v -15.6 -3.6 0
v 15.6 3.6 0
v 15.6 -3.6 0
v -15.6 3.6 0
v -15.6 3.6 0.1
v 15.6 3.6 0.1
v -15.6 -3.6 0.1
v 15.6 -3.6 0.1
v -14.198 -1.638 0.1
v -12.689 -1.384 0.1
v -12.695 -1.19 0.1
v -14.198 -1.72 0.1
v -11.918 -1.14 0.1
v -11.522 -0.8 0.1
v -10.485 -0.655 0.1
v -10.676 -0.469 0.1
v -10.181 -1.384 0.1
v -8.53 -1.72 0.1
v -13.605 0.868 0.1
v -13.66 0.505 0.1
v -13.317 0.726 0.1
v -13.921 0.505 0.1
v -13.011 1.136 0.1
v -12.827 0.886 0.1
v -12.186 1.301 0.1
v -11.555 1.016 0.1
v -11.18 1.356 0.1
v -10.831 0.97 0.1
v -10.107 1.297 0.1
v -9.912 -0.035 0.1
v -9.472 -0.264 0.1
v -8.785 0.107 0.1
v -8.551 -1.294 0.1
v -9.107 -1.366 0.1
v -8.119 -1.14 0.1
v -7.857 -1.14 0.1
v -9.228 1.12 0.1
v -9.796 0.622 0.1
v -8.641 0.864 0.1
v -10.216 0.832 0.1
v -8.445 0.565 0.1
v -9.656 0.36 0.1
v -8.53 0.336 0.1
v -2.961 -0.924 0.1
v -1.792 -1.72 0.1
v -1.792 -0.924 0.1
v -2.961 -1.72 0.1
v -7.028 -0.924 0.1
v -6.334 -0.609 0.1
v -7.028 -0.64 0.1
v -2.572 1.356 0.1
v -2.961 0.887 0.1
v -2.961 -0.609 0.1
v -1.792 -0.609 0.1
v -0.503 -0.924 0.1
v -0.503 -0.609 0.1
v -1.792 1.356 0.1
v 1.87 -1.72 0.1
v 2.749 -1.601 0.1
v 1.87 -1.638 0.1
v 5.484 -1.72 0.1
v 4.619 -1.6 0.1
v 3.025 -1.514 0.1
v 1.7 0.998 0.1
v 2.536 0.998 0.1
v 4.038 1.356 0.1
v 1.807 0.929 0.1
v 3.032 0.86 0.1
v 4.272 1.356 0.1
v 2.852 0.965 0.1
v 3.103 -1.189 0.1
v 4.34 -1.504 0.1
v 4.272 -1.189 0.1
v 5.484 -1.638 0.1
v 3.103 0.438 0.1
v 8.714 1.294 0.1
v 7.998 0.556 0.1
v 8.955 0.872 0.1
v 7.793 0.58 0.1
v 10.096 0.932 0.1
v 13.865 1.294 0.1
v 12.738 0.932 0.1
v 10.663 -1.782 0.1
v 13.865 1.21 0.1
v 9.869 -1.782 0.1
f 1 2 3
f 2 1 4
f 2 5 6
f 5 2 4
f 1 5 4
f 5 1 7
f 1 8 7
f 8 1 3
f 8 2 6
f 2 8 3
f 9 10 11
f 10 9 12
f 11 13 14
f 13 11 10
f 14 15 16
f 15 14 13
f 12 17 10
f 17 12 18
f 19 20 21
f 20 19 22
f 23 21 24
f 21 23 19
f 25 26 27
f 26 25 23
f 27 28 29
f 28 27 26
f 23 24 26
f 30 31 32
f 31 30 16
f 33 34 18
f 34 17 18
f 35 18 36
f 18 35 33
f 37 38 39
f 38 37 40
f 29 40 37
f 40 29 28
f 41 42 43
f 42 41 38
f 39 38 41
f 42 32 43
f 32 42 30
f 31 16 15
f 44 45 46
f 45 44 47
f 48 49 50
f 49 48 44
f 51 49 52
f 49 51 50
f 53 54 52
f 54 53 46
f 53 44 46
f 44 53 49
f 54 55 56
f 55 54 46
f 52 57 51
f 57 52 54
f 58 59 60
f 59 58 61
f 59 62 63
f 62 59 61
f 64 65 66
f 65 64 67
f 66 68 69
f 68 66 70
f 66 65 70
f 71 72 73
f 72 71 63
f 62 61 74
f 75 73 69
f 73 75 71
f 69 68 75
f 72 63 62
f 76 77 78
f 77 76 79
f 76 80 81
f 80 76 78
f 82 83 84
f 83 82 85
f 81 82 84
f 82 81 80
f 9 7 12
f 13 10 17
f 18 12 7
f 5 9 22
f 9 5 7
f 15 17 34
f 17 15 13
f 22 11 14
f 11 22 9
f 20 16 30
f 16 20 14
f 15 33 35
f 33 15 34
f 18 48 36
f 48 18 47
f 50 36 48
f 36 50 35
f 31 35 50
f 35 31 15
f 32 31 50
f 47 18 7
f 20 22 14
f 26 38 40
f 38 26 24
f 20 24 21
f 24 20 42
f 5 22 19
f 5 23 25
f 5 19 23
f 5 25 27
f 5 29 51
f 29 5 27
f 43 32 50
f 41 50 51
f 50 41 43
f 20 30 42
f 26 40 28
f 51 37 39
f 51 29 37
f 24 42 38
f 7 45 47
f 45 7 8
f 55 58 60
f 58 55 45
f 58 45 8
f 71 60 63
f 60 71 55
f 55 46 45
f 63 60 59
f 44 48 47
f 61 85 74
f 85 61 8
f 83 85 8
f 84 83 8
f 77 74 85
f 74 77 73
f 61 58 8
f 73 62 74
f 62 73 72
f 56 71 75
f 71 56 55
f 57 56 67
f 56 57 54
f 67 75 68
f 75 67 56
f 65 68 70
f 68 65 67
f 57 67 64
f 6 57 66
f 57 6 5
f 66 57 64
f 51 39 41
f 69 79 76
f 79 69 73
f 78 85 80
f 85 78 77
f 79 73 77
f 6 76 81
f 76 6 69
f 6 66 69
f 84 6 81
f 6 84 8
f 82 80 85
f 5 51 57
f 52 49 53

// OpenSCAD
// file: ../p/4-4edge.scad
use <../lib.scad>
$fa=1; $fs=0.2;
function ldraw_lib__4_4edge(realsolid=false) = [
// 0 Circle 1.0
// 0 Name: 4-4edge.dat
// 0 Author: James Jessiman
// 0 !LDRAW_ORG Primitive UPDATE 2017-01
// 0 !LICENSE Licensed under CC BY 2.0 and CC BY 4.0 : see CAreadme.txt
// 
// 0 BFC CERTIFY CCW
  [0,"BFC","CERTIFY"],
  [0,"BFC","CCW"],
// 
// 0 !HISTORY 1998-12-15 [PTadmin] Official Update 1998-10
// 0 !HISTORY 2005-12-28 [PTadmin] Official Update 2005-01
// 0 !HISTORY 2007-06-24 [PTadmin] Header formatted for Contributor Agreement
// 0 !HISTORY 2008-07-01 [PTadmin] Official Update 2008-01
// 0 !HISTORY 2017-01-15 [Steffen] BFCed
// 0 !HISTORY 2017-12-30 [PTadmin] Official Update 2017-01
// 
// 
// 2 24 1 0 0 0.9239 0 0.3827
  [2,24,1,0,0,0.9239,0,0.3827],
// 2 24 0.9239 0 0.3827 0.7071 0 0.7071
  [2,24,0.9239,0,0.3827,0.7071,0,0.7071],
// 2 24 0.7071 0 0.7071 0.3827 0 0.9239
  [2,24,0.7071,0,0.7071,0.3827,0,0.9239],
// 2 24 0.3827 0 0.9239 0 0 1
  [2,24,0.3827,0,0.9239,0,0,1],
// 2 24 0 0 1 -0.3827 0 0.9239
  [2,24,0,0,1,-0.3827,0,0.9239],
// 2 24 -0.3827 0 0.9239 -0.7071 0 0.7071
  [2,24,-0.3827,0,0.9239,-0.7071,0,0.7071],
// 2 24 -0.7071 0 0.7071 -0.9239 0 0.3827
  [2,24,-0.7071,0,0.7071,-0.9239,0,0.3827],
// 2 24 -0.9239 0 0.3827 -1 0 -0
  [2,24,-0.9239,0,0.3827,-1,0,-0],
// 2 24 -1 0 -0 -0.9239 0 -0.3827
  [2,24,-1,0,-0,-0.9239,0,-0.3827],
// 2 24 -0.9239 0 -0.3827 -0.7071 0 -0.7071
  [2,24,-0.9239,0,-0.3827,-0.7071,0,-0.7071],
// 2 24 -0.7071 0 -0.7071 -0.3827 0 -0.9239
  [2,24,-0.7071,0,-0.7071,-0.3827,0,-0.9239],
// 2 24 -0.3827 0 -0.9239 0 0 -1
  [2,24,-0.3827,0,-0.9239,0,0,-1],
// 2 24 0 0 -1 0.3827 0 -0.9239
  [2,24,0,0,-1,0.3827,0,-0.9239],
// 2 24 0.3827 0 -0.9239 0.7071 0 -0.7071
  [2,24,0.3827,0,-0.9239,0.7071,0,-0.7071],
// 2 24 0.7071 0 -0.7071 0.9239 0 -0.3827
  [2,24,0.7071,0,-0.7071,0.9239,0,-0.3827],
// 2 24 0.9239 0 -0.3827 1 0 0
  [2,24,0.9239,0,-0.3827,1,0,0],
];
module ldraw_lib__4_4edge(step=0, col=false, unit=2/5, alt=false, line=0.2, solid=!$preview)
    makepoly(ldraw_lib__4_4edge(solid), step=step, col=col, unit=unit, alt=alt, line=line, solid=solid);
ldraw_lib__4_4edge(line=0.2);
// file: ../p/4-4disc.scad
use <../lib.scad>
$fa=1; $fs=0.2;
function ldraw_lib__4_4disc(realsolid=false) = [
// 0 Disc 1.0
// 0 Name: 4-4disc.dat
// 0 Author: James Jessiman
// 0 !LDRAW_ORG Primitive UPDATE 2002-02
// 0 !LICENSE Licensed under CC BY 2.0 and CC BY 4.0 : see CAreadme.txt
// 
// 0 BFC CERTIFY CCW
  [0,"BFC","CERTIFY"],
  [0,"BFC","CCW"],
// 
// 0 !HISTORY 1998-12-15 [PTadmin] Official Update 1998-10
// 0 !HISTORY 2002-03-23 [sbliss] Added BFC statement
// 0 !HISTORY 2002-04-25 [PTadmin] Official Update 2002-02
// 0 !HISTORY 2007-06-24 [PTadmin] Header formatted for Contributor Agreement
// 0 !HISTORY 2008-07-01 [PTadmin] Official Update 2008-01
// 
// 
// 3 16 0 0 0 1 0 0 0.9239 0 0.3827
  [3,16,0,0,0,1,0,0,0.9239,0,0.3827],
// 3 16 0 0 0 0.9239 0 0.3827 0.7071 0 0.7071
  [3,16,0,0,0,0.9239,0,0.3827,0.7071,0,0.7071],
// 3 16 0 0 0 0.7071 0 0.7071 0.3827 0 0.9239
  [3,16,0,0,0,0.7071,0,0.7071,0.3827,0,0.9239],
// 3 16 0 0 0 0.3827 0 0.9239 0 0 1
  [3,16,0,0,0,0.3827,0,0.9239,0,0,1],
// 3 16 0 0 0 0 0 1 -0.3827 0 0.9239
  [3,16,0,0,0,0,0,1,-0.3827,0,0.9239],
// 3 16 0 0 0 -0.3827 0 0.9239 -0.7071 0 0.7071
  [3,16,0,0,0,-0.3827,0,0.9239,-0.7071,0,0.7071],
// 3 16 0 0 0 -0.7071 0 0.7071 -0.9239 0 0.3827
  [3,16,0,0,0,-0.7071,0,0.7071,-0.9239,0,0.3827],
// 3 16 0 0 0 -0.9239 0 0.3827 -1 0 -0
  [3,16,0,0,0,-0.9239,0,0.3827,-1,0,-0],
// 3 16 0 0 0 -1 0 -0 -0.9239 0 -0.3827
  [3,16,0,0,0,-1,0,-0,-0.9239,0,-0.3827],
// 3 16 0 0 0 -0.9239 0 -0.3827 -0.7071 0 -0.7071
  [3,16,0,0,0,-0.9239,0,-0.3827,-0.7071,0,-0.7071],
// 3 16 0 0 0 -0.7071 0 -0.7071 -0.3827 0 -0.9239
  [3,16,0,0,0,-0.7071,0,-0.7071,-0.3827,0,-0.9239],
// 3 16 0 0 0 -0.3827 0 -0.9239 0 0 -1
  [3,16,0,0,0,-0.3827,0,-0.9239,0,0,-1],
// 3 16 0 0 0 0 0 -1 0.3827 0 -0.9239
  [3,16,0,0,0,0,0,-1,0.3827,0,-0.9239],
// 3 16 0 0 0 0.3827 0 -0.9239 0.7071 0 -0.7071
  [3,16,0,0,0,0.3827,0,-0.9239,0.7071,0,-0.7071],
// 3 16 0 0 0 0.7071 0 -0.7071 0.9239 0 -0.3827
  [3,16,0,0,0,0.7071,0,-0.7071,0.9239,0,-0.3827],
// 3 16 0 0 0 0.9239 0 -0.3827 1 0 0
  [3,16,0,0,0,0.9239,0,-0.3827,1,0,0],
// 0
];
module ldraw_lib__4_4disc(step=0, col=false, unit=2/5, alt=false, line=0.2, solid=!$preview)
    makepoly(ldraw_lib__4_4disc(solid), step=step, col=col, unit=unit, alt=alt, line=line, solid=solid);
ldraw_lib__4_4disc(line=0.2);
// file: ../p/4-4cyli.scad
use <../lib.scad>
$fa=1; $fs=0.2;
function ldraw_lib__4_4cyli(realsolid=false) = [
// 0 Cylinder 1.0
// 0 Name: 4-4cyli.dat
// 0 Author: James Jessiman
// 0 !LDRAW_ORG Primitive UPDATE 2005-01
// 0 !LICENSE Licensed under CC BY 2.0 and CC BY 4.0 : see CAreadme.txt
// 
// 0 BFC CERTIFY CCW
  [0,"BFC","CERTIFY"],
  [0,"BFC","CCW"],
// 
// 0 !HISTORY 1998-12-15 [PTadmin] Official Update 1998-10
// 0 !HISTORY 2002-03-23 [sbliss] Added BFC statement; merged headers from files in distributions LDraw 0.27 and Complete.
// 0 !HISTORY 2002-04-25 [PTadmin] Official Update 2002-02
// 0 !HISTORY 2004-12-14 [guyvivan] BFC CCW
// 0 !HISTORY 2005-12-28 [PTadmin] Official Update 2005-01
// 0 !HISTORY 2007-06-24 [PTadmin] Header formatted for Contributor Agreement
// 0 !HISTORY 2008-07-01 [PTadmin] Official Update 2008-01
// 
// 
// 4 16 1 1 0 0.9239 1 0.3827 0.9239 0 0.3827 1 0 0
  [4,16,1,1,0,0.9239,1,0.3827,0.9239,0,0.3827,1,0,0],
// 5 24 1 0 0 1 1 0 0.9239 0 0.3827 0.9239 0 -0.3827
  [5,24,1,0,0,1,1,0,0.9239,0,0.3827,0.9239,0,-0.3827],
// 4 16 0.9239 1 0.3827 0.7071 1 0.7071 0.7071 0 0.7071 0.9239 0 0.3827
  [4,16,0.9239,1,0.3827,0.7071,1,0.7071,0.7071,0,0.7071,0.9239,0,0.3827],
// 5 24 0.9239 0 0.3827 0.9239 1 0.3827 0.7071 0 0.7071 1 0 0
  [5,24,0.9239,0,0.3827,0.9239,1,0.3827,0.7071,0,0.7071,1,0,0],
// 4 16 0.7071 1 0.7071 0.3827 1 0.9239 0.3827 0 0.9239 0.7071 0 0.7071
  [4,16,0.7071,1,0.7071,0.3827,1,0.9239,0.3827,0,0.9239,0.7071,0,0.7071],
// 5 24 0.7071 0 0.7071 0.7071 1 0.7071 0.3827 0 0.9239 0.9239 0 0.3827
  [5,24,0.7071,0,0.7071,0.7071,1,0.7071,0.3827,0,0.9239,0.9239,0,0.3827],
// 4 16 0.3827 1 0.9239 0 1 1 0 0 1 0.3827 0 0.9239
  [4,16,0.3827,1,0.9239,0,1,1,0,0,1,0.3827,0,0.9239],
// 5 24 0.3827 0 0.9239 0.3827 1 0.9239 0 0 1 0.7071 0 0.7071
  [5,24,0.3827,0,0.9239,0.3827,1,0.9239,0,0,1,0.7071,0,0.7071],
// 4 16 0 1 1 -0.3827 1 0.9239 -0.3827 0 0.9239 0 0 1
  [4,16,0,1,1,-0.3827,1,0.9239,-0.3827,0,0.9239,0,0,1],
// 5 24 0 0 1 0 1 1 -0.3827 0 0.9239 0.3827 0 0.9239
  [5,24,0,0,1,0,1,1,-0.3827,0,0.9239,0.3827,0,0.9239],
// 4 16 -0.3827 1 0.9239 -0.7071 1 0.7071 -0.7071 0 0.7071 -0.3827 0 0.9239
  [4,16,-0.3827,1,0.9239,-0.7071,1,0.7071,-0.7071,0,0.7071,-0.3827,0,0.9239],
// 5 24 -0.3827 0 0.9239 -0.3827 1 0.9239 -0.7071 0 0.7071 0 0 1
  [5,24,-0.3827,0,0.9239,-0.3827,1,0.9239,-0.7071,0,0.7071,0,0,1],
// 4 16 -0.7071 1 0.7071 -0.9239 1 0.3827 -0.9239 0 0.3827 -0.7071 0 0.7071
  [4,16,-0.7071,1,0.7071,-0.9239,1,0.3827,-0.9239,0,0.3827,-0.7071,0,0.7071],
// 5 24 -0.7071 0 0.7071 -0.7071 1 0.7071 -0.9239 0 0.3827 -0.3827 0 0.9239
  [5,24,-0.7071,0,0.7071,-0.7071,1,0.7071,-0.9239,0,0.3827,-0.3827,0,0.9239],
// 4 16 -0.9239 1 0.3827 -1 1 0 -1 0 0 -0.9239 0 0.3827
  [4,16,-0.9239,1,0.3827,-1,1,0,-1,0,0,-0.9239,0,0.3827],
// 5 24 -0.9239 0 0.3827 -0.9239 1 0.3827 -1 0 0 -0.7071 0 0.7071
  [5,24,-0.9239,0,0.3827,-0.9239,1,0.3827,-1,0,0,-0.7071,0,0.7071],
// 4 16 -1 1 0 -0.9239 1 -0.3827 -0.9239 0 -0.3827 -1 0 0
  [4,16,-1,1,0,-0.9239,1,-0.3827,-0.9239,0,-0.3827,-1,0,0],
// 5 24 -1 0 0 -1 1 0 -0.9239 0 -0.3827 -0.9239 0 0.3827
  [5,24,-1,0,0,-1,1,0,-0.9239,0,-0.3827,-0.9239,0,0.3827],
// 4 16 -0.9239 1 -0.3827 -0.7071 1 -0.7071 -0.7071 0 -0.7071 -0.9239 0 -0.3827
  [4,16,-0.9239,1,-0.3827,-0.7071,1,-0.7071,-0.7071,0,-0.7071,-0.9239,0,-0.3827],
// 5 24 -0.9239 0 -0.3827 -0.9239 1 -0.3827 -0.7071 0 -0.7071 -1 0 0
  [5,24,-0.9239,0,-0.3827,-0.9239,1,-0.3827,-0.7071,0,-0.7071,-1,0,0],
// 4 16 -0.7071 1 -0.7071 -0.3827 1 -0.9239 -0.3827 0 -0.9239 -0.7071 0 -0.7071
  [4,16,-0.7071,1,-0.7071,-0.3827,1,-0.9239,-0.3827,0,-0.9239,-0.7071,0,-0.7071],
// 5 24 -0.7071 0 -0.7071 -0.7071 1 -0.7071 -0.3827 0 -0.9239 -0.9239 0 -0.3827
  [5,24,-0.7071,0,-0.7071,-0.7071,1,-0.7071,-0.3827,0,-0.9239,-0.9239,0,-0.3827],
// 4 16 -0.3827 1 -0.9239 0 1 -1 0 0 -1 -0.3827 0 -0.9239
  [4,16,-0.3827,1,-0.9239,0,1,-1,0,0,-1,-0.3827,0,-0.9239],
// 5 24 -0.3827 0 -0.9239 -0.3827 1 -0.9239 0 0 -1 -0.7071 0 -0.7071
  [5,24,-0.3827,0,-0.9239,-0.3827,1,-0.9239,0,0,-1,-0.7071,0,-0.7071],
// 4 16 0 1 -1 0.3827 1 -0.9239 0.3827 0 -0.9239 0 0 -1
  [4,16,0,1,-1,0.3827,1,-0.9239,0.3827,0,-0.9239,0,0,-1],
// 5 24 0 0 -1 0 1 -1 0.3827 0 -0.9239 -0.3827 0 -0.9239
  [5,24,0,0,-1,0,1,-1,0.3827,0,-0.9239,-0.3827,0,-0.9239],
// 4 16 0.3827 1 -0.9239 0.7071 1 -0.7071 0.7071 0 -0.7071 0.3827 0 -0.9239
  [4,16,0.3827,1,-0.9239,0.7071,1,-0.7071,0.7071,0,-0.7071,0.3827,0,-0.9239],
// 5 24 0.3827 0 -0.9239 0.3827 1 -0.9239 0.7071 0 -0.7071 0 0 -1
  [5,24,0.3827,0,-0.9239,0.3827,1,-0.9239,0.7071,0,-0.7071,0,0,-1],
// 4 16 0.7071 1 -0.7071 0.9239 1 -0.3827 0.9239 0 -0.3827 0.7071 0 -0.7071
  [4,16,0.7071,1,-0.7071,0.9239,1,-0.3827,0.9239,0,-0.3827,0.7071,0,-0.7071],
// 5 24 0.7071 0 -0.7071 0.7071 1 -0.7071 0.9239 0 -0.3827 0.3827 0 -0.9239
  [5,24,0.7071,0,-0.7071,0.7071,1,-0.7071,0.9239,0,-0.3827,0.3827,0,-0.9239],
// 4 16 0.9239 1 -0.3827 1 1 0 1 0 0 0.9239 0 -0.3827
  [4,16,0.9239,1,-0.3827,1,1,0,1,0,0,0.9239,0,-0.3827],
// 5 24 0.9239 0 -0.3827 0.9239 1 -0.3827 1 0 0 0.7071 0 -0.7071
  [5,24,0.9239,0,-0.3827,0.9239,1,-0.3827,1,0,0,0.7071,0,-0.7071],
// 0
];
module ldraw_lib__4_4cyli(step=0, col=false, unit=2/5, alt=false, line=0.2, solid=!$preview)
    makepoly(ldraw_lib__4_4cyli(solid), step=step, col=col, unit=unit, alt=alt, line=line, solid=solid);
ldraw_lib__4_4cyli(line=0.2);
// file: ../p/stud3.scad
use <../lib.scad>
use <4-4cyli.scad>
use <4-4disc.scad>
use <4-4edge.scad>
$fa=1; $fs=0.2;
function ldraw_lib__stud3(realsolid=false) = realsolid ? 
    [openscad(translate([0,0,-eps()], o=cylinder(4+eps(), r=4)),2)] : [
// 0 Stud Tube Solid
// 0 Name: stud3.dat
// 0 Author: James Jessiman
// 0 !LDRAW_ORG Primitive UPDATE 2012-01
// 0 !LICENSE Licensed under CC BY 2.0 and CC BY 4.0 : see CAreadme.txt
// 
// 0 BFC CERTIFY CCW
  [0,"BFC","CERTIFY"],
  [0,"BFC","CCW"],
// 
// 0 !HISTORY 2002-04-04 [sbliss] Modified for BFC compliance
// 0 !HISTORY 2002-04-25 [PTadmin] Official Update 2002-02
// 0 !HISTORY 2007-06-24 [PTadmin] Header formatted for Contributor Agreement
// 0 !HISTORY 2008-07-01 [PTadmin] Official Update 2008-01
// 0 !HISTORY 2012-02-16 [Philo] Changed to CCW
// 0 !HISTORY 2012-03-30 [PTadmin] Official Update 2012-01
// 
// 
// 1 16 0 -4 0 4 0 0 0 1 0 0 0 4 4-4edge.dat
  [1,16,0,-4,0,4,0,0,0,1,0,0,0,4, ldraw_lib__4_4edge(realsolid)],
// 1 16 0 0 0 4 0 0 0 1 0 0 0 4 4-4edge.dat
  [1,16,0,0,0,4,0,0,0,1,0,0,0,4, ldraw_lib__4_4edge(realsolid)],
// 1 16 0 -4 0 4 0 0 0 1 0 0 0 4 4-4disc.dat
  [1,16,0,-4,0,4,0,0,0,1,0,0,0,4, ldraw_lib__4_4disc(realsolid)],
// 1 16 0 -4 0 4 0 0 0 4 0 0 0 4 4-4cyli.dat
  [1,16,0,-4,0,4,0,0,0,4,0,0,0,4, ldraw_lib__4_4cyli(realsolid)],
];
module ldraw_lib__stud3(step=0, col=false, unit=2/5, alt=false, line=0.2, solid=!$preview)
    makepoly(ldraw_lib__stud3(solid), step=step, col=col, unit=unit, alt=alt, line=line, solid=solid);
ldraw_lib__stud3(line=0.2);
// file: ../p/stud.scad
use <../lib.scad>
use <4-4cyli.scad>
use <4-4disc.scad>
use <4-4edge.scad>
$fa=1; $fs=0.2;
function ldraw_lib__stud(realsolid=false) = realsolid ? 
    [openscad(translate([0,0,-eps()], o=cylinder(4+eps(), r=6)),2)] : [
// 0 Stud
// 0 Name: stud.dat
// 0 Author: James Jessiman
// 0 !LDRAW_ORG Primitive UPDATE 2012-01
// 0 !LICENSE Licensed under CC BY 2.0 and CC BY 4.0 : see CAreadme.txt
// 
// 0 BFC CERTIFY CCW
  [0,"BFC","CERTIFY"],
  [0,"BFC","CCW"],
// 
// 0 !HISTORY 2002-04-04 [sbliss] Modified for BFC compliance
// 0 !HISTORY 2002-04-25 [PTadmin] Official Update 2002-02
// 0 !HISTORY 2007-06-24 [PTadmin] Header formatted for Contributor Agreement
// 0 !HISTORY 2008-07-01 [PTadmin] Official Update 2008-01
// 0 !HISTORY 2012-02-16 [Philo] Changed to CCW
// 0 !HISTORY 2012-03-30 [PTadmin] Official Update 2012-01
// 
// 
// 1 16 0 0 0 6 0 0 0 1 0 0 0 6 4-4edge.dat
  [1,16,0,0,0,6,0,0,0,1,0,0,0,6, ldraw_lib__4_4edge(realsolid)],
// 1 16 0 -4 0 6 0 0 0 1 0 0 0 6 4-4edge.dat
  [1,16,0,-4,0,6,0,0,0,1,0,0,0,6, ldraw_lib__4_4edge(realsolid)],
// 1 16 0 0 0 6 0 0 0 -4 0 0 0 6 4-4cyli.dat
  [1,16,0,0,0,6,0,0,0,-4,0,0,0,6, ldraw_lib__4_4cyli(realsolid)],
// 1 16 0 -4 0 6 0 0 0 1 0 0 0 6 4-4disc.dat
  [1,16,0,-4,0,6,0,0,0,1,0,0,0,6, ldraw_lib__4_4disc(realsolid)],
];
module ldraw_lib__stud(step=0, col=false, unit=2/5, alt=false, line=0.2, solid=!$preview)
    makepoly(ldraw_lib__stud(solid), step=step, col=col, unit=unit, alt=alt, line=line, solid=solid);
ldraw_lib__stud(line=0.2);
// file: ../p/box5.scad
use <../lib.scad>
$fa=1; $fs=0.2;
function ldraw_lib__box5(realsolid=false) = [
// 0 Box with 5 Faces and All Edges
// 0 Name: box5.dat
// 0 Author: James Jessiman
// 0 !LDRAW_ORG Primitive UPDATE 2012-01
// 0 !LICENSE Licensed under CC BY 2.0 and CC BY 4.0 : see CAreadme.txt
// 
// 0 BFC CERTIFY CCW
  [0,"BFC","CERTIFY"],
  [0,"BFC","CCW"],
// 
// 0 !HISTORY 2002-04-03 [sbliss] Modified for BFC compliance
// 0 !HISTORY 2002-04-25 [PTadmin] Official Update 2002-02
// 0 !HISTORY 2007-06-24 [PTadmin] Header formatted for Contributor Agreement
// 0 !HISTORY 2008-07-01 [PTadmin] Official Update 2008-01
// 0 !HISTORY 2012-02-16 [Philo] Changed to CCW
// 0 !HISTORY 2012-03-30 [PTadmin] Official Update 2012-01
// 
// 
// 2 24 1 1 1 -1 1 1
  [2,24,1,1,1,-1,1,1],
// 2 24 -1 1 1 -1 1 -1
  [2,24,-1,1,1,-1,1,-1],
// 2 24 -1 1 -1 1 1 -1
  [2,24,-1,1,-1,1,1,-1],
// 2 24 1 1 -1 1 1 1
  [2,24,1,1,-1,1,1,1],
// 2 24 1 0 1 -1 0 1
  [2,24,1,0,1,-1,0,1],
// 2 24 -1 0 1 -1 0 -1
  [2,24,-1,0,1,-1,0,-1],
// 2 24 -1 0 -1 1 0 -1
  [2,24,-1,0,-1,1,0,-1],
// 2 24 1 0 -1 1 0 1
  [2,24,1,0,-1,1,0,1],
// 2 24 1 0 1 1 1 1
  [2,24,1,0,1,1,1,1],
// 2 24 -1 0 1 -1 1 1
  [2,24,-1,0,1,-1,1,1],
// 2 24 1 0 -1 1 1 -1
  [2,24,1,0,-1,1,1,-1],
// 2 24 -1 0 -1 -1 1 -1
  [2,24,-1,0,-1,-1,1,-1],
// 4 16 -1 1 1 1 1 1 1 1 -1 -1 1 -1
  [4,16,-1,1,1,1,1,1,1,1,-1,-1,1,-1],
// 4 16 -1 1 1 -1 0 1 1 0 1 1 1 1
  [4,16,-1,1,1,-1,0,1,1,0,1,1,1,1],
// 4 16 -1 1 -1 -1 0 -1 -1 0 1 -1 1 1
  [4,16,-1,1,-1,-1,0,-1,-1,0,1,-1,1,1],
// 4 16 1 1 -1 1 0 -1 -1 0 -1 -1 1 -1
  [4,16,1,1,-1,1,0,-1,-1,0,-1,-1,1,-1],
// 4 16 1 1 1 1 0 1 1 0 -1 1 1 -1
  [4,16,1,1,1,1,0,1,1,0,-1,1,1,-1],
];
module ldraw_lib__box5(step=0, col=false, unit=2/5, alt=false, line=0.2, solid=!$preview)
    makepoly(ldraw_lib__box5(solid), step=step, col=col, unit=unit, alt=alt, line=line, solid=solid);
ldraw_lib__box5(line=0.2);
// file: ../p/box4t.scad
use <../lib.scad>
$fa=1; $fs=0.2;
function ldraw_lib__box4t(realsolid=false) = [
// 0 Box with 4 Adjacent Faces and All Edges
// 0 Name: box4t.dat
// 0 Author: Tore Eriksson [Tore_Eriksson]
// 0 !LDRAW_ORG Primitive UPDATE 2003-02
// 0 !LICENSE Licensed under CC BY 2.0 and CC BY 4.0 : see CAreadme.txt
// 
// 0 BFC CERTIFY CCW
  [0,"BFC","CERTIFY"],
  [0,"BFC","CCW"],
// 
// 0 !HISTORY 1997-09-29 [PTadmin] Official Update 1997-15
// 0 !HISTORY 2002-08-31 [izanette] Modified with WINDZ for BFC compliance
// 0 !HISTORY 2003-08-01 [PTadmin] Official Update 2003-02
// 0 !HISTORY 2007-06-24 [PTadmin] Header formatted for Contributor Agreement
// 0 !HISTORY 2008-07-01 [PTadmin] Official Update 2008-01
// 
// 
// 2 24 1 1 1 -1 1 1
  [2,24,1,1,1,-1,1,1],
// 2 24 -1 1 1 -1 1 -1
  [2,24,-1,1,1,-1,1,-1],
// 2 24 -1 1 -1 1 1 -1
  [2,24,-1,1,-1,1,1,-1],
// 2 24 1 1 -1 1 1 1
  [2,24,1,1,-1,1,1,1],
// 2 24 1 0 1 -1 0 1
  [2,24,1,0,1,-1,0,1],
// 2 24 -1 0 1 -1 0 -1
  [2,24,-1,0,1,-1,0,-1],
// 2 24 -1 0 -1 1 0 -1
  [2,24,-1,0,-1,1,0,-1],
// 2 24 1 0 -1 1 0 1
  [2,24,1,0,-1,1,0,1],
// 2 24 1 0 1 1 1 1
  [2,24,1,0,1,1,1,1],
// 2 24 -1 0 1 -1 1 1
  [2,24,-1,0,1,-1,1,1],
// 2 24 1 0 -1 1 1 -1
  [2,24,1,0,-1,1,1,-1],
// 2 24 -1 0 -1 -1 1 -1
  [2,24,-1,0,-1,-1,1,-1],
// 4 16 1 1 1 1 1 -1 -1 1 -1 -1 1 1
  [4,16,1,1,1,1,1,-1,-1,1,-1,-1,1,1],
// 4 16 1 1 1 -1 1 1 -1 0 1 1 0 1
  [4,16,1,1,1,-1,1,1,-1,0,1,1,0,1],
// 4 16 -1 1 1 -1 1 -1 -1 0 -1 -1 0 1
  [4,16,-1,1,1,-1,1,-1,-1,0,-1,-1,0,1],
// 0 4 16 -1 1 -1 -1 0 -1 1 0 -1 1 1 -1
// 4 16 1 1 -1 1 1 1 1 0 1 1 0 -1
  [4,16,1,1,-1,1,1,1,1,0,1,1,0,-1],
// 0
];
module ldraw_lib__box4t(step=0, col=false, unit=2/5, alt=false, line=0.2, solid=!$preview)
    makepoly(ldraw_lib__box4t(solid), step=step, col=col, unit=unit, alt=alt, line=line, solid=solid);
ldraw_lib__box4t(line=0.2);
// file: s/3004s01.scad
use <../../lib.scad>
use <../../p/box4t.scad>
use <../../p/box5.scad>
use <../../p/stud.scad>
use <../../p/stud3.scad>
$fa=1; $fs=0.2;
function ldraw_lib__s__3004s01(realsolid=false) = [
// 0 ~Brick  1 x  2 without Front Face
// 0 Name: s\3004s01.dat
// 0 Author: James Jessiman
// 0 !LDRAW_ORG Subpart UPDATE 2003-03
// 0 !LICENSE Licensed under CC BY 2.0 and CC BY 4.0 : see CAreadme.txt
// 
// 0 BFC CERTIFY CCW
  [0,"BFC","CERTIFY"],
  [0,"BFC","CCW"],
// 
// 0 !HISTORY 2003-09-07 [jriley] Subfiling, BFC
// 0 !HISTORY 2003-12-19 [PTadmin] Official Update 2003-03
// 0 !HISTORY 2007-08-29 [PTadmin] Header formatted for Contributor Agreement
// 0 !HISTORY 2008-07-01 [PTadmin] Official Update 2008-01
// 
// 
// 1 16 0 4 0 1 0 0 0 -5 0 0 0 1 stud3.dat
  [1,16,0,4,0,1,0,0,0,-5,0,0,0,1, ldraw_lib__stud3(realsolid)],
// 0 BFC INVERTNEXT
  [0,"BFC","INVERTNEXT"],
// 1 16 0 24 0 16 0 0 0 -20 0 0 0 6 box5.dat
  [1,16,0,24,0,16,0,0,0,-20,0,0,0,6, ldraw_lib__box5(realsolid)],
// 4 16 20 24 10 16 24 6 -16 24 6 -20 24 10
  [4,16,20,24,10,16,24,6,-16,24,6,-20,24,10],
// 4 16 -20 24 10 -16 24 6 -16 24 -6 -20 24 -10
  [4,16,-20,24,10,-16,24,6,-16,24,-6,-20,24,-10],
// 4 16 -20 24 -10 -16 24 -6 16 24 -6 20 24 -10
  [4,16,-20,24,-10,-16,24,-6,16,24,-6,20,24,-10],
// 4 16 20 24 -10 16 24 -6 16 24 6 20 24 10
  [4,16,20,24,-10,16,24,-6,16,24,6,20,24,10],
// 1 16 0 24 0 20 0 0 0 -24 0 0 0 10 box4t.dat
  [1,16,0,24,0,20,0,0,0,-24,0,0,0,10, ldraw_lib__box4t(realsolid)],
// 1 16 10 0 0 1 0 0 0 1 0 0 0 1 stud.dat
  [1,16,10,0,0,1,0,0,0,1,0,0,0,1, ldraw_lib__stud(realsolid)],
// 1 16 -10 0 0 1 0 0 0 1 0 0 0 1 stud.dat
  [1,16,-10,0,0,1,0,0,0,1,0,0,0,1, ldraw_lib__stud(realsolid)],
// 0
];
module ldraw_lib__s__3004s01(step=0, col=false, unit=2/5, alt=false, line=0.2, solid=!$preview)
    makepoly(ldraw_lib__s__3004s01(solid), step=step, col=col, unit=unit, alt=alt, line=line, solid=solid);
ldraw_lib__s__3004s01(line=0.2);
// file: 3004.scad
use <../lib.scad>
use <s/3004s01.scad>
$fa=1; $fs=0.2;
function ldraw_lib__3004(realsolid=false) = [
// 0 Brick  1 x  2
// 0 Name: 3004.dat
// 0 Author: James Jessiman
// 0 !LDRAW_ORG Part UPDATE 2022-05
// 0 !LICENSE Licensed under CC BY 2.0 and CC BY 4.0 : see CAreadme.txt
// 
// 0 BFC CERTIFY CCW
  [0,"BFC","CERTIFY"],
  [0,"BFC","CCW"],
// 
// 0 !HISTORY 2001-10-26 [PTadmin] Official Update 2001-01
// 0 !HISTORY 2002-05-07 {unknown} BFC Certification
// 0 !HISTORY 2002-06-11 [PTadmin] Official Update 2002-03
// 0 !HISTORY 2007-05-07 [PTadmin] Header formatted for Contributor Agreement
// 0 !HISTORY 2008-07-01 [PTadmin] Official Update 2008-01
// 0 !HISTORY 2022-08-04 [MagFors] Using subfile
// 0 !HISTORY 2022-09-15 [PTadmin] Official Update 2022-05
// 
// 
// 1 16 0 0 0 1 0 0 0 1 0 0 0 1 s\3004s01.dat
  [1,16,0,0,0,1,0,0,0,1,0,0,0,1, ldraw_lib__s__3004s01(realsolid)],
// 4 16 -20 24 -10 20 24 -10 20 0 -10 -20 0 -10
  [4,16,-20,24,-10,20,24,-10,20,0,-10,-20,0,-10],
];
module ldraw_lib__3004(step=0, col=false, unit=2/5, alt=false, line=0.2, solid=!$preview)
    makepoly(ldraw_lib__3004(solid), step=step, col=col, unit=unit, alt=alt, line=line, solid=solid);
ldraw_lib__3004(line=0.2);
// file: ../p/box5-12.scad
use <../lib.scad>
$fa=1; $fs=0.2;
function ldraw_lib__box5_12(realsolid=false) = [
// 0 Box with 5 Faces without Any Edges
// 0 Name: box5-12.dat
// 0 Author: Chris Dee [cwdee]
// 0 !LDRAW_ORG Primitive UPDATE 2009-02
// 0 !LICENSE Licensed under CC BY 2.0 and CC BY 4.0 : see CAreadme.txt
// 
// 0 BFC CERTIFY CCW
  [0,"BFC","CERTIFY"],
  [0,"BFC","CCW"],
// 
// 0 !HISTORY 2009-09-03 [PTadmin] Official Update 2009-02
// 
// 
// 4 16 1 1 1 1 1 -1 -1 1 -1 -1 1 1
  [4,16,1,1,1,1,1,-1,-1,1,-1,-1,1,1],
// 4 16 -1 0 1 1 0 1 1 1 1 -1 1 1
  [4,16,-1,0,1,1,0,1,1,1,1,-1,1,1],
// 4 16 -1 0 -1 -1 0 1 -1 1 1 -1 1 -1
  [4,16,-1,0,-1,-1,0,1,-1,1,1,-1,1,-1],
// 4 16 1 0 -1 -1 0 -1 -1 1 -1 1 1 -1
  [4,16,1,0,-1,-1,0,-1,-1,1,-1,1,1,-1],
// 4 16 1 0 1 1 0 -1 1 1 -1 1 1 1
  [4,16,1,0,1,1,0,-1,1,1,-1,1,1,1],
// 0
];
module ldraw_lib__box5_12(step=0, col=false, unit=2/5, alt=false, line=0.2, solid=!$preview)
    makepoly(ldraw_lib__box5_12(solid), step=step, col=col, unit=unit, alt=alt, line=line, solid=solid);
ldraw_lib__box5_12(line=0.2);
// main file
use <../lib.scad>
use <../p/box5-12.scad>
$fa=1; $fs=0.2;
function ldraw_lib__4188571k(realsolid=false) = [
// 0 Sticker  0.9 x  3.9 with Black "2417"
// 0 Name: 4188571k.dat
// 0 Author: Gerald Lasser [GeraldLasser]
// 0 !LDRAW_ORG Part UPDATE 2015-01
// 0 !LICENSE Licensed under CC BY 2.0 and CC BY 4.0 : see CAreadme.txt
// 
// 0 BFC CERTIFY CCW
  [0,"BFC","CERTIFY"],
  [0,"BFC","CCW"],
// 
// 0 !KEYWORDS santa fe, Train
// 
// 0 !HISTORY 2015-10-11 [PTadmin] Official Update 2015-01
// 
// 
// 0 // Original Text Produced by txt2dat, Copyright 2005-2007, 2009 R. Crawford
// 0 // Using font: "Times New Roman" style: "Regular" size: 40pt
// 0 // LDRAW Scaling of Txt2dat output: 1.02 0 0 0 1 0 0 0 0.32
// 
// 1 80 0 -0.25 0 39 0 0 0 0.25 0 0 0 9 box5-12.dat
  [1,80,0,-0.25,0,39,0,0,0,0.25,0,0,0,9, ldraw_lib__box5_12(realsolid)],
// 
// 4 0 -31.722 -0.25 -3.461 -31.737 -0.25 -2.975 -35.494 -0.25 -4.094 -35.494 -0.25 -4.3
  [4,0,-31.722,-0.25,-3.461,-31.737,-0.25,-2.975,-35.494,-0.25,-4.094,-35.494,-0.25,-4.3],
// 4 0 -29.795 -0.25 -2.85 -28.804 -0.25 -2 -31.737 -0.25 -2.975 -31.722 -0.25 -3.461
  [4,0,-29.795,-0.25,-2.85,-28.804,-0.25,-2,-31.737,-0.25,-2.975,-31.722,-0.25,-3.461],
// 4 0 -26.213 -0.25 -1.638 -26.691 -0.25 -1.172 -28.804 -0.25 -2 -29.795 -0.25 -2.85
  [4,0,-26.213,-0.25,-1.638,-26.691,-0.25,-1.172,-28.804,-0.25,-2,-29.795,-0.25,-2.85],
// 4 0 -25.452 -0.25 -3.461 -31.722 -0.25 -3.461 -35.494 -0.25 -4.3 -21.325 -0.25 -4.3
  [4,0,-25.452,-0.25,-3.461,-31.722,-0.25,-3.461,-35.494,-0.25,-4.3,-21.325,-0.25,-4.3],
// 4 0 -33.292 -0.25 1.815 -34.013 -0.25 2.171 -34.803 -0.25 1.262 -34.149 -0.25 1.262
  [4,0,-33.292,-0.25,1.815,-34.013,-0.25,2.171,-34.803,-0.25,1.262,-34.149,-0.25,1.262],
// 4 0 -32.067 -0.25 2.215 -32.528 -0.25 2.84 -34.013 -0.25 2.171 -33.292 -0.25 1.815
  [4,0,-32.067,-0.25,2.215,-32.528,-0.25,2.84,-34.013,-0.25,2.171,-33.292,-0.25,1.815],
// 4 0 -28.888 -0.25 2.54 -27.949 -0.25 3.39 -30.466 -0.25 3.253 -32.528 -0.25 2.84
  [4,0,-28.888,-0.25,2.54,-27.949,-0.25,3.39,-30.466,-0.25,3.253,-32.528,-0.25,2.84],
// 4 0 -27.949 -0.25 3.39 -28.888 -0.25 2.54 -27.077 -0.25 2.425 -25.268 -0.25 3.243
  [4,0,-27.949,-0.25,3.39,-28.888,-0.25,2.54,-27.077,-0.25,2.425,-25.268,-0.25,3.243],
// 3 0 -32.528 -0.25 2.84 -32.067 -0.25 2.215 -28.888 -0.25 2.54
  [3,0,-32.528,-0.25,2.84,-32.067,-0.25,2.215,-28.888,-0.25,2.54],
// 4 0 -23.68 -0.25 -0.659 -21.963 -0.25 0.268 -24.779 -0.25 -0.087 -26.691 -0.25 -1.172
  [4,0,-23.68,-0.25,-0.659,-21.963,-0.25,0.268,-24.779,-0.25,-0.087,-26.691,-0.25,-1.172],
// 3 0 -21.378 -0.25 -3.236 -22.768 -0.25 -3.416 -21.325 -0.25 -4.3
  [3,0,-21.378,-0.25,-3.236,-22.768,-0.25,-3.416,-21.325,-0.25,-4.3],
// 3 0 -22.768 -0.25 -3.416 -25.452 -0.25 -3.461 -21.325 -0.25 -4.3
  [3,0,-22.768,-0.25,-3.416,-25.452,-0.25,-3.461,-21.325,-0.25,-4.3],
// 4 0 -19.642 -0.25 -2.85 -20.298 -0.25 -2.85 -21.378 -0.25 -3.236 -21.325 -0.25 -4.3
  [4,0,-19.642,-0.25,-2.85,-20.298,-0.25,-2.85,-21.378,-0.25,-3.236,-21.325,-0.25,-4.3],
// 4 0 -25.541 -0.25 2.079 -24.49 -0.25 1.554 -21.602 -0.25 2.16 -23.069 -0.25 2.801
  [4,0,-25.541,-0.25,2.079,-24.49,-0.25,1.554,-21.602,-0.25,2.16,-23.069,-0.25,2.801],
// 4 0 -25.268 -0.25 3.243 -27.077 -0.25 2.425 -25.541 -0.25 2.079 -23.069 -0.25 2.801
  [4,0,-25.268,-0.25,3.243,-27.077,-0.25,2.425,-25.541,-0.25,2.079,-23.069,-0.25,2.801],
// 4 0 -21.112 -0.25 1.412 -24.49 -0.25 1.554 -24.141 -0.25 0.901 -21.325 -0.25 0.84
  [4,0,-21.112,-0.25,1.412,-24.49,-0.25,1.554,-24.141,-0.25,0.901,-21.325,-0.25,0.84],
// 3 0 -21.602 -0.25 2.16 -24.49 -0.25 1.554 -21.112 -0.25 1.412
  [3,0,-21.602,-0.25,2.16,-24.49,-0.25,1.554,-21.112,-0.25,1.412],
// 4 0 -21.963 -0.25 0.268 -21.325 -0.25 0.84 -24.141 -0.25 0.901 -24.779 -0.25 -0.087
  [4,0,-21.963,-0.25,0.268,-21.325,-0.25,0.84,-24.141,-0.25,0.901,-24.779,-0.25,-0.087],
// 3 0 -23.68 -0.25 -0.659 -26.691 -0.25 -1.172 -26.213 -0.25 -1.638
  [3,0,-23.68,-0.25,-0.659,-26.691,-0.25,-1.172,-26.213,-0.25,-1.638],
// 4 0 -7.403 -0.25 -2.311 -7.403 -0.25 -4.3 -4.481 -0.25 -4.3 -4.481 -0.25 -2.311
  [4,0,-7.403,-0.25,-2.311,-7.403,-0.25,-4.3,-4.481,-0.25,-4.3,-4.481,-0.25,-2.311],
// 4 0 -17.571 -0.25 -2.311 -7.403 -0.25 -2.311 -15.834 -0.25 -1.522 -17.571 -0.25 -1.6
  [4,0,-17.571,-0.25,-2.311,-7.403,-0.25,-2.311,-15.834,-0.25,-1.522,-17.571,-0.25,-1.6],
// 4 0 -17.571 -0.25 -1.6 -15.834 -0.25 -1.522 -7.403 -0.25 2.218 -6.429 -0.25 3.39
  [4,0,-17.571,-0.25,-1.6,-15.834,-0.25,-1.522,-7.403,-0.25,2.218,-6.429,-0.25,3.39],
// 4 0 -4.481 -0.25 -1.522 -7.403 -0.25 2.218 -7.403 -0.25 -1.522 -4.481 -0.25 -2.311
  [4,0,-4.481,-0.25,-1.522,-7.403,-0.25,2.218,-7.403,-0.25,-1.522,-4.481,-0.25,-2.311],
// 4 0 -7.403 -0.25 -1.522 -15.834 -0.25 -1.522 -7.403 -0.25 -2.311 -4.481 -0.25 -2.311
  [4,0,-7.403,-0.25,-1.522,-15.834,-0.25,-1.522,-7.403,-0.25,-2.311,-4.481,-0.25,-2.311],
// 4 0 -4.481 -0.25 -2.311 -1.258 -0.25 -2.311 -1.258 -0.25 -1.522 -4.481 -0.25 -1.522
  [4,0,-4.481,-0.25,-2.311,-1.258,-0.25,-2.311,-1.258,-0.25,-1.522,-4.481,-0.25,-1.522],
// 4 0 -4.481 -0.25 3.39 -6.429 -0.25 3.39 -7.403 -0.25 2.218 -4.481 -0.25 -1.522
  [4,0,-4.481,-0.25,3.39,-6.429,-0.25,3.39,-7.403,-0.25,2.218,-4.481,-0.25,-1.522],
// 4 0 6.872 -0.25 -4.003 4.676 -0.25 -4.094 4.676 -0.25 -4.3 13.709 -0.25 -4.3
  [4,0,6.872,-0.25,-4.003,4.676,-0.25,-4.094,4.676,-0.25,-4.3,13.709,-0.25,-4.3],
// 4 0 11.548 -0.25 -4 7.563 -0.25 -3.786 6.872 -0.25 -4.003 13.709 -0.25 -4.3
  [4,0,11.548,-0.25,-4,7.563,-0.25,-3.786,6.872,-0.25,-4.003,13.709,-0.25,-4.3],
// 4 0 4.25 -0.25 2.496 4.517 -0.25 2.323 6.341 -0.25 2.496 10.096 -0.25 3.39
  [4,0,4.25,-0.25,2.496,4.517,-0.25,2.323,6.341,-0.25,2.496,10.096,-0.25,3.39],
// 4 0 10.096 -0.25 3.39 7.129 -0.25 2.412 7.581 -0.25 2.151 10.68 -0.25 3.39
  [4,0,10.096,-0.25,3.39,7.129,-0.25,2.412,7.581,-0.25,2.151,10.68,-0.25,3.39],
// 3 0 10.096 -0.25 3.39 6.341 -0.25 2.496 7.129 -0.25 2.412
  [3,0,10.096,-0.25,3.39,6.341,-0.25,2.496,7.129,-0.25,2.412],
// 4 0 7.758 -0.25 -2.972 7.563 -0.25 -3.786 10.849 -0.25 -3.761 10.68 -0.25 -2.972
  [4,0,7.758,-0.25,-2.972,7.563,-0.25,-3.786,10.849,-0.25,-3.761,10.68,-0.25,-2.972],
// 3 0 11.548 -0.25 -4 13.709 -0.25 -4.3 13.709 -0.25 -4.094
  [3,0,11.548,-0.25,-4,13.709,-0.25,-4.3,13.709,-0.25,-4.094],
// 4 0 7.758 -0.25 1.096 7.758 -0.25 -2.972 10.68 -0.25 -2.972 10.68 -0.25 3.39
  [4,0,7.758,-0.25,1.096,7.758,-0.25,-2.972,10.68,-0.25,-2.972,10.68,-0.25,3.39],
// 3 0 10.68 -0.25 3.39 7.581 -0.25 2.151 7.758 -0.25 1.096
  [3,0,10.68,-0.25,3.39,7.581,-0.25,2.151,7.758,-0.25,1.096],
// 3 0 10.849 -0.25 -3.761 7.563 -0.25 -3.786 11.548 -0.25 -4
  [3,0,10.849,-0.25,-3.761,7.563,-0.25,-3.786,11.548,-0.25,-4],
// 4 0 22.388 -0.25 2.179 21.785 -0.25 3.235 19.483 -0.25 1.451 19.996 -0.25 1.39
  [4,0,22.388,-0.25,2.179,21.785,-0.25,3.235,19.483,-0.25,1.451,19.996,-0.25,1.39],
// 4 0 21.785 -0.25 3.235 22.388 -0.25 2.179 25.239 -0.25 2.329 34.662 -0.25 3.235
  [4,0,21.785,-0.25,3.235,22.388,-0.25,2.179,25.239,-0.25,2.329,34.662,-0.25,3.235],
// 4 0 31.845 -0.25 2.329 24.673 -0.25 -4.456 26.657 -0.25 -4.456 34.662 -0.25 3.024
  [4,0,31.845,-0.25,2.329,24.673,-0.25,-4.456,26.657,-0.25,-4.456,34.662,-0.25,3.024],
// 4 0 31.845 -0.25 2.329 34.662 -0.25 3.024 34.662 -0.25 3.235 25.239 -0.25 2.329
  [4,0,31.845,-0.25,2.329,34.662,-0.25,3.024,34.662,-0.25,3.235,25.239,-0.25,2.329],
// 3 80 -35.494 -0.25 -4.094 -39 -0.25 -9 -35.494 -0.25 -4.3
  [3,80,-35.494,-0.25,-4.094,-39,-0.25,-9,-35.494,-0.25,-4.3],
// 3 80 -29.795 -0.25 -2.85 -31.722 -0.25 -3.461 -25.452 -0.25 -3.461
  [3,80,-29.795,-0.25,-2.85,-31.722,-0.25,-3.461,-25.452,-0.25,-3.461],
// 3 80 -21.325 -0.25 -4.3 -35.494 -0.25 -4.3 -39 -0.25 -9
  [3,80,-21.325,-0.25,-4.3,-35.494,-0.25,-4.3,-39,-0.25,-9],
// 4 80 -39 -0.25 -9 -35.494 -0.25 -4.094 -34.803 -0.25 1.262 -39 -0.25 9
  [4,80,-39,-0.25,-9,-35.494,-0.25,-4.094,-34.803,-0.25,1.262,-39,-0.25,9],
// 4 80 -26.213 -0.25 -1.638 -29.795 -0.25 -2.85 -25.452 -0.25 -3.461 -22.768 -0.25 -3.416
  [4,80,-26.213,-0.25,-1.638,-29.795,-0.25,-2.85,-25.452,-0.25,-3.461,-22.768,-0.25,-3.416],
// 4 80 -31.737 -0.25 -2.975 -28.804 -0.25 -2 -34.803 -0.25 1.262 -35.494 -0.25 -4.094
  [4,80,-31.737,-0.25,-2.975,-28.804,-0.25,-2,-34.803,-0.25,1.262,-35.494,-0.25,-4.094],
// 4 80 -34.149 -0.25 1.262 -28.804 -0.25 -2 -26.691 -0.25 -1.172 -24.779 -0.25 -0.087
  [4,80,-34.149,-0.25,1.262,-28.804,-0.25,-2,-26.691,-0.25,-1.172,-24.779,-0.25,-0.087],
// 4 80 -22.768 -0.25 -3.416 -21.378 -0.25 -3.236 -20.298 -0.25 -2.85 -26.213 -0.25 -1.638
  [4,80,-22.768,-0.25,-3.416,-21.378,-0.25,-3.236,-20.298,-0.25,-2.85,-26.213,-0.25,-1.638],
// 4 80 -7.403 -0.25 -4.3 -17.571 -0.25 -2.311 -19.642 -0.25 -2.85 -21.325 -0.25 -4.3
  [4,80,-7.403,-0.25,-4.3,-17.571,-0.25,-2.311,-19.642,-0.25,-2.85,-21.325,-0.25,-4.3],
// 4 80 -20.298 -0.25 -2.85 -19.642 -0.25 -2.85 -17.571 -0.25 -2.311 -17.571 -0.25 -1.6
  [4,80,-20.298,-0.25,-2.85,-19.642,-0.25,-2.85,-17.571,-0.25,-2.311,-17.571,-0.25,-1.6],
// 4 80 -23.68 -0.25 -0.659 -26.213 -0.25 -1.638 -20.298 -0.25 -2.85 -17.571 -0.25 -1.6
  [4,80,-23.68,-0.25,-0.659,-26.213,-0.25,-1.638,-20.298,-0.25,-2.85,-17.571,-0.25,-1.6],
// 3 80 -21.963 -0.25 0.268 -23.68 -0.25 -0.659 -17.571 -0.25 -1.6
  [3,80,-21.963,-0.25,0.268,-23.68,-0.25,-0.659,-17.571,-0.25,-1.6],
// 3 80 -7.403 -0.25 -4.3 -21.325 -0.25 -4.3 -39 -0.25 -9
  [3,80,-7.403,-0.25,-4.3,-21.325,-0.25,-4.3,-39,-0.25,-9],
// 3 80 -34.149 -0.25 1.262 -34.803 -0.25 1.262 -28.804 -0.25 -2
  [3,80,-34.149,-0.25,1.262,-34.803,-0.25,1.262,-28.804,-0.25,-2],
// 4 80 -28.888 -0.25 2.54 -32.067 -0.25 2.215 -24.49 -0.25 1.554 -25.541 -0.25 2.079
  [4,80,-28.888,-0.25,2.54,-32.067,-0.25,2.215,-24.49,-0.25,1.554,-25.541,-0.25,2.079],
// 4 80 -24.141 -0.25 0.901 -32.067 -0.25 2.215 -33.292 -0.25 1.815 -34.149 -0.25 1.262
  [4,80,-24.141,-0.25,0.901,-32.067,-0.25,2.215,-33.292,-0.25,1.815,-34.149,-0.25,1.262],
// 3 80 -39 -0.25 9 -34.803 -0.25 1.262 -34.013 -0.25 2.171
  [3,80,-39,-0.25,9,-34.803,-0.25,1.262,-34.013,-0.25,2.171],
// 3 80 -39 -0.25 9 -32.528 -0.25 2.84 -30.466 -0.25 3.253
  [3,80,-39,-0.25,9,-32.528,-0.25,2.84,-30.466,-0.25,3.253],
// 3 80 -39 -0.25 9 -34.013 -0.25 2.171 -32.528 -0.25 2.84
  [3,80,-39,-0.25,9,-34.013,-0.25,2.171,-32.528,-0.25,2.84],
// 3 80 -39 -0.25 9 -30.466 -0.25 3.253 -27.949 -0.25 3.39
  [3,80,-39,-0.25,9,-30.466,-0.25,3.253,-27.949,-0.25,3.39],
// 4 80 -6.429 -0.25 3.39 -39 -0.25 9 -27.949 -0.25 3.39 -25.268 -0.25 3.243
  [4,80,-6.429,-0.25,3.39,-39,-0.25,9,-27.949,-0.25,3.39,-25.268,-0.25,3.243],
// 3 80 -21.325 -0.25 0.84 -21.963 -0.25 0.268 -17.571 -0.25 -1.6
  [3,80,-21.325,-0.25,0.84,-21.963,-0.25,0.268,-17.571,-0.25,-1.6],
// 4 80 -21.112 -0.25 1.412 -21.325 -0.25 0.84 -17.571 -0.25 -1.6 -6.429 -0.25 3.39
  [4,80,-21.112,-0.25,1.412,-21.325,-0.25,0.84,-17.571,-0.25,-1.6,-6.429,-0.25,3.39],
// 3 80 -34.149 -0.25 1.262 -24.779 -0.25 -0.087 -24.141 -0.25 0.901
  [3,80,-34.149,-0.25,1.262,-24.779,-0.25,-0.087,-24.141,-0.25,0.901],
// 3 80 -28.888 -0.25 2.54 -25.541 -0.25 2.079 -27.077 -0.25 2.425
  [3,80,-28.888,-0.25,2.54,-25.541,-0.25,2.079,-27.077,-0.25,2.425],
// 3 80 -6.429 -0.25 3.39 -23.069 -0.25 2.801 -21.602 -0.25 2.16
  [3,80,-6.429,-0.25,3.39,-23.069,-0.25,2.801,-21.602,-0.25,2.16],
// 3 80 -6.429 -0.25 3.39 -25.268 -0.25 3.243 -23.069 -0.25 2.801
  [3,80,-6.429,-0.25,3.39,-25.268,-0.25,3.243,-23.069,-0.25,2.801],
// 3 80 -32.067 -0.25 2.215 -24.141 -0.25 0.901 -24.49 -0.25 1.554
  [3,80,-32.067,-0.25,2.215,-24.141,-0.25,0.901,-24.49,-0.25,1.554],
// 4 80 -4.481 -0.25 -4.3 -7.403 -0.25 -4.3 -39 -0.25 -9 39 -0.25 -9
  [4,80,-4.481,-0.25,-4.3,-7.403,-0.25,-4.3,-39,-0.25,-9,39,-0.25,-9],
// 4 80 4.676 -0.25 -4.094 -1.258 -0.25 -2.311 -4.481 -0.25 -4.3 4.676 -0.25 -4.3
  [4,80,4.676,-0.25,-4.094,-1.258,-0.25,-2.311,-4.481,-0.25,-4.3,4.676,-0.25,-4.3],
// 3 80 4.676 -0.25 -4.3 -4.481 -0.25 -4.3 39 -0.25 -9
  [3,80,4.676,-0.25,-4.3,-4.481,-0.25,-4.3,39,-0.25,-9],
// 4 80 7.758 -0.25 -2.972 -1.258 -0.25 -2.311 4.676 -0.25 -4.094 7.563 -0.25 -3.786
  [4,80,7.758,-0.25,-2.972,-1.258,-0.25,-2.311,4.676,-0.25,-4.094,7.563,-0.25,-3.786],
// 3 80 -1.258 -0.25 -2.311 -4.481 -0.25 -2.311 -4.481 -0.25 -4.3
  [3,80,-1.258,-0.25,-2.311,-4.481,-0.25,-2.311,-4.481,-0.25,-4.3],
// 3 80 7.563 -0.25 -3.786 4.676 -0.25 -4.094 6.872 -0.25 -4.003
  [3,80,7.563,-0.25,-3.786,4.676,-0.25,-4.094,6.872,-0.25,-4.003],
// 3 80 -7.403 -0.25 -2.311 -17.571 -0.25 -2.311 -7.403 -0.25 -4.3
  [3,80,-7.403,-0.25,-2.311,-17.571,-0.25,-2.311,-7.403,-0.25,-4.3],
// 4 80 24.673 -0.25 -4.456 13.709 -0.25 -4.094 13.709 -0.25 -4.3 39 -0.25 -9
  [4,80,24.673,-0.25,-4.456,13.709,-0.25,-4.094,13.709,-0.25,-4.3,39,-0.25,-9],
// 3 80 26.657 -0.25 -4.456 24.673 -0.25 -4.456 39 -0.25 -9
  [3,80,26.657,-0.25,-4.456,24.673,-0.25,-4.456,39,-0.25,-9],
// 3 80 34.662 -0.25 3.024 26.657 -0.25 -4.456 39 -0.25 -9
  [3,80,34.662,-0.25,3.024,26.657,-0.25,-4.456,39,-0.25,-9],
// 4 80 19.996 -0.25 1.39 10.68 -0.25 -2.972 13.709 -0.25 -4.094 24.673 -0.25 -4.456
  [4,80,19.996,-0.25,1.39,10.68,-0.25,-2.972,13.709,-0.25,-4.094,24.673,-0.25,-4.456],
// 3 80 13.709 -0.25 -4.3 4.676 -0.25 -4.3 39 -0.25 -9
  [3,80,13.709,-0.25,-4.3,4.676,-0.25,-4.3,39,-0.25,-9],
// 4 80 10.849 -0.25 -3.761 11.548 -0.25 -4 13.709 -0.25 -4.094 10.68 -0.25 -2.972
  [4,80,10.849,-0.25,-3.761,11.548,-0.25,-4,13.709,-0.25,-4.094,10.68,-0.25,-2.972],
// 4 80 -1.258 -0.25 -1.522 -1.258 -0.25 -2.311 7.758 -0.25 -2.972 7.758 -0.25 1.096
  [4,80,-1.258,-0.25,-1.522,-1.258,-0.25,-2.311,7.758,-0.25,-2.972,7.758,-0.25,1.096],
// 4 80 -1.258 -0.25 -1.522 4.517 -0.25 2.323 -4.481 -0.25 3.39 -4.481 -0.25 -1.522
  [4,80,-1.258,-0.25,-1.522,4.517,-0.25,2.323,-4.481,-0.25,3.39,-4.481,-0.25,-1.522],
// 4 80 7.758 -0.25 1.096 7.581 -0.25 2.151 4.517 -0.25 2.323 -1.258 -0.25 -1.522
  [4,80,7.758,-0.25,1.096,7.581,-0.25,2.151,4.517,-0.25,2.323,-1.258,-0.25,-1.522],
// 4 80 6.341 -0.25 2.496 4.517 -0.25 2.323 7.581 -0.25 2.151 7.129 -0.25 2.412
  [4,80,6.341,-0.25,2.496,4.517,-0.25,2.323,7.581,-0.25,2.151,7.129,-0.25,2.412],
// 3 80 -4.481 -0.25 3.39 4.517 -0.25 2.323 4.25 -0.25 2.496
  [3,80,-4.481,-0.25,3.39,4.517,-0.25,2.323,4.25,-0.25,2.496],
// 4 80 39 -0.25 9 -39 -0.25 9 -4.481 -0.25 3.39 10.096 -0.25 3.39
  [4,80,39,-0.25,9,-39,-0.25,9,-4.481,-0.25,3.39,10.096,-0.25,3.39],
// 3 80 10.096 -0.25 3.39 -4.481 -0.25 3.39 4.25 -0.25 2.496
  [3,80,10.096,-0.25,3.39,-4.481,-0.25,3.39,4.25,-0.25,2.496],
// 3 80 -6.429 -0.25 3.39 -21.602 -0.25 2.16 -21.112 -0.25 1.412
  [3,80,-6.429,-0.25,3.39,-21.602,-0.25,2.16,-21.112,-0.25,1.412],
// 4 80 10.68 -0.25 3.39 10.68 -0.25 -2.972 19.483 -0.25 1.451 21.785 -0.25 3.235
  [4,80,10.68,-0.25,3.39,10.68,-0.25,-2.972,19.483,-0.25,1.451,21.785,-0.25,3.235],
// 4 80 25.239 -0.25 2.329 22.388 -0.25 2.179 19.996 -0.25 1.39 24.673 -0.25 -4.456
  [4,80,25.239,-0.25,2.329,22.388,-0.25,2.179,19.996,-0.25,1.39,24.673,-0.25,-4.456],
// 3 80 19.483 -0.25 1.451 10.68 -0.25 -2.972 19.996 -0.25 1.39
  [3,80,19.483,-0.25,1.451,10.68,-0.25,-2.972,19.996,-0.25,1.39],
// 4 80 39 -0.25 9 10.68 -0.25 3.39 21.785 -0.25 3.235 34.662 -0.25 3.235
  [4,80,39,-0.25,9,10.68,-0.25,3.39,21.785,-0.25,3.235,34.662,-0.25,3.235],
// 3 80 39 -0.25 9 10.096 -0.25 3.39 10.68 -0.25 3.39
  [3,80,39,-0.25,9,10.096,-0.25,3.39,10.68,-0.25,3.39],
// 4 80 39 -0.25 9 34.662 -0.25 3.235 34.662 -0.25 3.024 39 -0.25 -9
  [4,80,39,-0.25,9,34.662,-0.25,3.235,34.662,-0.25,3.024,39,-0.25,-9],
// 3 80 31.845 -0.25 2.329 25.239 -0.25 2.329 24.673 -0.25 -4.456
  [3,80,31.845,-0.25,2.329,25.239,-0.25,2.329,24.673,-0.25,-4.456],
// 3 80 -39 -0.25 9 -6.429 -0.25 3.39 -4.481 -0.25 3.39
  [3,80,-39,-0.25,9,-6.429,-0.25,3.39,-4.481,-0.25,3.39],
// 3 80 -7.403 -0.25 2.218 -15.834 -0.25 -1.522 -7.403 -0.25 -1.522
  [3,80,-7.403,-0.25,2.218,-15.834,-0.25,-1.522,-7.403,-0.25,-1.522],
];
module ldraw_lib__4188571k(step=0, col=false, unit=2/5, alt=false, line=0.2, solid=!$preview)
    makepoly(ldraw_lib__4188571k(solid), step=step, col=col, unit=unit, alt=alt, line=line, solid=solid);
ldraw_lib__4188571k(line=0.2);
